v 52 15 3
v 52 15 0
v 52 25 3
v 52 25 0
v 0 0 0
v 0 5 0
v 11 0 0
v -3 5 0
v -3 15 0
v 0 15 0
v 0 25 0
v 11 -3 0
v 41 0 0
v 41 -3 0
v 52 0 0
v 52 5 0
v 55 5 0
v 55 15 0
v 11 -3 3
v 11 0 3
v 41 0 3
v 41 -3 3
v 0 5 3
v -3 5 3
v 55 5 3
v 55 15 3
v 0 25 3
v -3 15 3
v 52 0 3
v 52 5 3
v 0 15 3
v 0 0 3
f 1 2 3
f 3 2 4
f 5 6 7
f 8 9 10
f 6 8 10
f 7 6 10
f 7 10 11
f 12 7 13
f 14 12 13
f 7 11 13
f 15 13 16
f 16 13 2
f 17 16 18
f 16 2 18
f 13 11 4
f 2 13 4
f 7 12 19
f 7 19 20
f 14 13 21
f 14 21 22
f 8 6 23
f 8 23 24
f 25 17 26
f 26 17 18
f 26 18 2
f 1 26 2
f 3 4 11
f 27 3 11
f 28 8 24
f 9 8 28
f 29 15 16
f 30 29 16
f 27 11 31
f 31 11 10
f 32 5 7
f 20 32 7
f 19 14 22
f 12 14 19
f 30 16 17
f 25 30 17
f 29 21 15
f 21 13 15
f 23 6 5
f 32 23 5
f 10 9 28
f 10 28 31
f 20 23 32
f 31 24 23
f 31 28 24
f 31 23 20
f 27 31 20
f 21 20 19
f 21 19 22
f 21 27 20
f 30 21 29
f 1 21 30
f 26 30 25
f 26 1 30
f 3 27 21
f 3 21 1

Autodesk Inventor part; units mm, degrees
ref_plane "YZ Plane" through (0, 0, 0) normal (1, 0, 0) x (0, 1, 0)
ref_plane "XZ Plane" through (0, 0, 0) normal (0, 1, 0) x (-1, 0, 0)
ref_plane "XY Plane" through (0, 0, 0) normal (0, 0, 1) x (1, 0, 0)
sketch "Sketch1" plane through (0, 0, 0) normal (0, 0, 1) x (1, 0, 0)
  line L0 (0, 0) -> (52, 0)
  line L1 (52, 0) -> (52, 25)
  line L2 (52, 25) -> (0, 25)
  line L3 (0, 25) -> (0, 0)
  line L4 (11, 0) -> (41, 0)
  line L5 (41, 0) -> (41, -3)
  line L6 (41, -3) -> (11, -3)
  line L7 (11, -3) -> (11, 0)
  line L8 (0, 5) -> (-3, 5)
  line L9 (-3, 5) -> (-3, 15)
  line L10 (-3, 15) -> (0, 15)
  line L11 (0, 15) -> (0, 5)
  line L12 (26, 25) -> (26, 0)
  line L13 (52, 5) -> (55, 5)
  line L14 (55, 5) -> (55, 15)
  line L15 (55, 15) -> (52, 15)
  point P0 (0, 15)
  point P1 (41, 0)
  point P2 (52, 5)
  point P3 (0, 15)
  dimension "d0" = 52
  dimension "d1" = 30
  dimension "d2" = 3
  dimension "d3" = 25
  dimension "d4" = 3
  dimension "d5" = 10
  dimension "d6" = 5
extrude "Plate1" add sketch "Sketch1" along normal blind 3
equation "\"d0\" = A_width + 2 * A_joint_tolerance"
equation "\"d2\" = plate_thickness"
equation "\"d4\" = plate_thickness"
equation "\"d7\" = Thickness"
equation "\"Thickness\" = plate_thickness"
equation "\"BendRadius\" = Thickness"
equation "\"BendReliefWidth\" = Thickness"
equation "\"BendReliefDepth\" = 0.5 * Thickness"
equation "\"CornerReliefSize\" = 4 * Thickness"
equation "\"MinimumRemnant\" = 2 * Thickness"
equation "\"TransitionRadius\" = BendRadius"
equation "\"JacobiRadiusSize\" = BendRadius"
equation "\"GapSize\" = Thickness"
equation "\"A_width\" = 46"
equation "\"A_joint_diameter\" = 16"
equation "\"l___________\" = 0"
equation "\"l__________\" = 0"
equation "\"l_________\" = 0"
equation "\"rivet_diameter\" = 3.35"
equation "\"plate_thickness\" = 3"
equation "\"l________\" = 0"
equation "\"A_joint_tolerance\" = 3"
equation "\"A_B_spacing\" = 2"
equation "\"L_Piston_Bottom\" = 21"
equation "\"L_Piston_Top\" = 25"
equation "\"thin_plate\" = 1.5"
properties part number "bottom_hinge_002" material "Stainless Steel"
